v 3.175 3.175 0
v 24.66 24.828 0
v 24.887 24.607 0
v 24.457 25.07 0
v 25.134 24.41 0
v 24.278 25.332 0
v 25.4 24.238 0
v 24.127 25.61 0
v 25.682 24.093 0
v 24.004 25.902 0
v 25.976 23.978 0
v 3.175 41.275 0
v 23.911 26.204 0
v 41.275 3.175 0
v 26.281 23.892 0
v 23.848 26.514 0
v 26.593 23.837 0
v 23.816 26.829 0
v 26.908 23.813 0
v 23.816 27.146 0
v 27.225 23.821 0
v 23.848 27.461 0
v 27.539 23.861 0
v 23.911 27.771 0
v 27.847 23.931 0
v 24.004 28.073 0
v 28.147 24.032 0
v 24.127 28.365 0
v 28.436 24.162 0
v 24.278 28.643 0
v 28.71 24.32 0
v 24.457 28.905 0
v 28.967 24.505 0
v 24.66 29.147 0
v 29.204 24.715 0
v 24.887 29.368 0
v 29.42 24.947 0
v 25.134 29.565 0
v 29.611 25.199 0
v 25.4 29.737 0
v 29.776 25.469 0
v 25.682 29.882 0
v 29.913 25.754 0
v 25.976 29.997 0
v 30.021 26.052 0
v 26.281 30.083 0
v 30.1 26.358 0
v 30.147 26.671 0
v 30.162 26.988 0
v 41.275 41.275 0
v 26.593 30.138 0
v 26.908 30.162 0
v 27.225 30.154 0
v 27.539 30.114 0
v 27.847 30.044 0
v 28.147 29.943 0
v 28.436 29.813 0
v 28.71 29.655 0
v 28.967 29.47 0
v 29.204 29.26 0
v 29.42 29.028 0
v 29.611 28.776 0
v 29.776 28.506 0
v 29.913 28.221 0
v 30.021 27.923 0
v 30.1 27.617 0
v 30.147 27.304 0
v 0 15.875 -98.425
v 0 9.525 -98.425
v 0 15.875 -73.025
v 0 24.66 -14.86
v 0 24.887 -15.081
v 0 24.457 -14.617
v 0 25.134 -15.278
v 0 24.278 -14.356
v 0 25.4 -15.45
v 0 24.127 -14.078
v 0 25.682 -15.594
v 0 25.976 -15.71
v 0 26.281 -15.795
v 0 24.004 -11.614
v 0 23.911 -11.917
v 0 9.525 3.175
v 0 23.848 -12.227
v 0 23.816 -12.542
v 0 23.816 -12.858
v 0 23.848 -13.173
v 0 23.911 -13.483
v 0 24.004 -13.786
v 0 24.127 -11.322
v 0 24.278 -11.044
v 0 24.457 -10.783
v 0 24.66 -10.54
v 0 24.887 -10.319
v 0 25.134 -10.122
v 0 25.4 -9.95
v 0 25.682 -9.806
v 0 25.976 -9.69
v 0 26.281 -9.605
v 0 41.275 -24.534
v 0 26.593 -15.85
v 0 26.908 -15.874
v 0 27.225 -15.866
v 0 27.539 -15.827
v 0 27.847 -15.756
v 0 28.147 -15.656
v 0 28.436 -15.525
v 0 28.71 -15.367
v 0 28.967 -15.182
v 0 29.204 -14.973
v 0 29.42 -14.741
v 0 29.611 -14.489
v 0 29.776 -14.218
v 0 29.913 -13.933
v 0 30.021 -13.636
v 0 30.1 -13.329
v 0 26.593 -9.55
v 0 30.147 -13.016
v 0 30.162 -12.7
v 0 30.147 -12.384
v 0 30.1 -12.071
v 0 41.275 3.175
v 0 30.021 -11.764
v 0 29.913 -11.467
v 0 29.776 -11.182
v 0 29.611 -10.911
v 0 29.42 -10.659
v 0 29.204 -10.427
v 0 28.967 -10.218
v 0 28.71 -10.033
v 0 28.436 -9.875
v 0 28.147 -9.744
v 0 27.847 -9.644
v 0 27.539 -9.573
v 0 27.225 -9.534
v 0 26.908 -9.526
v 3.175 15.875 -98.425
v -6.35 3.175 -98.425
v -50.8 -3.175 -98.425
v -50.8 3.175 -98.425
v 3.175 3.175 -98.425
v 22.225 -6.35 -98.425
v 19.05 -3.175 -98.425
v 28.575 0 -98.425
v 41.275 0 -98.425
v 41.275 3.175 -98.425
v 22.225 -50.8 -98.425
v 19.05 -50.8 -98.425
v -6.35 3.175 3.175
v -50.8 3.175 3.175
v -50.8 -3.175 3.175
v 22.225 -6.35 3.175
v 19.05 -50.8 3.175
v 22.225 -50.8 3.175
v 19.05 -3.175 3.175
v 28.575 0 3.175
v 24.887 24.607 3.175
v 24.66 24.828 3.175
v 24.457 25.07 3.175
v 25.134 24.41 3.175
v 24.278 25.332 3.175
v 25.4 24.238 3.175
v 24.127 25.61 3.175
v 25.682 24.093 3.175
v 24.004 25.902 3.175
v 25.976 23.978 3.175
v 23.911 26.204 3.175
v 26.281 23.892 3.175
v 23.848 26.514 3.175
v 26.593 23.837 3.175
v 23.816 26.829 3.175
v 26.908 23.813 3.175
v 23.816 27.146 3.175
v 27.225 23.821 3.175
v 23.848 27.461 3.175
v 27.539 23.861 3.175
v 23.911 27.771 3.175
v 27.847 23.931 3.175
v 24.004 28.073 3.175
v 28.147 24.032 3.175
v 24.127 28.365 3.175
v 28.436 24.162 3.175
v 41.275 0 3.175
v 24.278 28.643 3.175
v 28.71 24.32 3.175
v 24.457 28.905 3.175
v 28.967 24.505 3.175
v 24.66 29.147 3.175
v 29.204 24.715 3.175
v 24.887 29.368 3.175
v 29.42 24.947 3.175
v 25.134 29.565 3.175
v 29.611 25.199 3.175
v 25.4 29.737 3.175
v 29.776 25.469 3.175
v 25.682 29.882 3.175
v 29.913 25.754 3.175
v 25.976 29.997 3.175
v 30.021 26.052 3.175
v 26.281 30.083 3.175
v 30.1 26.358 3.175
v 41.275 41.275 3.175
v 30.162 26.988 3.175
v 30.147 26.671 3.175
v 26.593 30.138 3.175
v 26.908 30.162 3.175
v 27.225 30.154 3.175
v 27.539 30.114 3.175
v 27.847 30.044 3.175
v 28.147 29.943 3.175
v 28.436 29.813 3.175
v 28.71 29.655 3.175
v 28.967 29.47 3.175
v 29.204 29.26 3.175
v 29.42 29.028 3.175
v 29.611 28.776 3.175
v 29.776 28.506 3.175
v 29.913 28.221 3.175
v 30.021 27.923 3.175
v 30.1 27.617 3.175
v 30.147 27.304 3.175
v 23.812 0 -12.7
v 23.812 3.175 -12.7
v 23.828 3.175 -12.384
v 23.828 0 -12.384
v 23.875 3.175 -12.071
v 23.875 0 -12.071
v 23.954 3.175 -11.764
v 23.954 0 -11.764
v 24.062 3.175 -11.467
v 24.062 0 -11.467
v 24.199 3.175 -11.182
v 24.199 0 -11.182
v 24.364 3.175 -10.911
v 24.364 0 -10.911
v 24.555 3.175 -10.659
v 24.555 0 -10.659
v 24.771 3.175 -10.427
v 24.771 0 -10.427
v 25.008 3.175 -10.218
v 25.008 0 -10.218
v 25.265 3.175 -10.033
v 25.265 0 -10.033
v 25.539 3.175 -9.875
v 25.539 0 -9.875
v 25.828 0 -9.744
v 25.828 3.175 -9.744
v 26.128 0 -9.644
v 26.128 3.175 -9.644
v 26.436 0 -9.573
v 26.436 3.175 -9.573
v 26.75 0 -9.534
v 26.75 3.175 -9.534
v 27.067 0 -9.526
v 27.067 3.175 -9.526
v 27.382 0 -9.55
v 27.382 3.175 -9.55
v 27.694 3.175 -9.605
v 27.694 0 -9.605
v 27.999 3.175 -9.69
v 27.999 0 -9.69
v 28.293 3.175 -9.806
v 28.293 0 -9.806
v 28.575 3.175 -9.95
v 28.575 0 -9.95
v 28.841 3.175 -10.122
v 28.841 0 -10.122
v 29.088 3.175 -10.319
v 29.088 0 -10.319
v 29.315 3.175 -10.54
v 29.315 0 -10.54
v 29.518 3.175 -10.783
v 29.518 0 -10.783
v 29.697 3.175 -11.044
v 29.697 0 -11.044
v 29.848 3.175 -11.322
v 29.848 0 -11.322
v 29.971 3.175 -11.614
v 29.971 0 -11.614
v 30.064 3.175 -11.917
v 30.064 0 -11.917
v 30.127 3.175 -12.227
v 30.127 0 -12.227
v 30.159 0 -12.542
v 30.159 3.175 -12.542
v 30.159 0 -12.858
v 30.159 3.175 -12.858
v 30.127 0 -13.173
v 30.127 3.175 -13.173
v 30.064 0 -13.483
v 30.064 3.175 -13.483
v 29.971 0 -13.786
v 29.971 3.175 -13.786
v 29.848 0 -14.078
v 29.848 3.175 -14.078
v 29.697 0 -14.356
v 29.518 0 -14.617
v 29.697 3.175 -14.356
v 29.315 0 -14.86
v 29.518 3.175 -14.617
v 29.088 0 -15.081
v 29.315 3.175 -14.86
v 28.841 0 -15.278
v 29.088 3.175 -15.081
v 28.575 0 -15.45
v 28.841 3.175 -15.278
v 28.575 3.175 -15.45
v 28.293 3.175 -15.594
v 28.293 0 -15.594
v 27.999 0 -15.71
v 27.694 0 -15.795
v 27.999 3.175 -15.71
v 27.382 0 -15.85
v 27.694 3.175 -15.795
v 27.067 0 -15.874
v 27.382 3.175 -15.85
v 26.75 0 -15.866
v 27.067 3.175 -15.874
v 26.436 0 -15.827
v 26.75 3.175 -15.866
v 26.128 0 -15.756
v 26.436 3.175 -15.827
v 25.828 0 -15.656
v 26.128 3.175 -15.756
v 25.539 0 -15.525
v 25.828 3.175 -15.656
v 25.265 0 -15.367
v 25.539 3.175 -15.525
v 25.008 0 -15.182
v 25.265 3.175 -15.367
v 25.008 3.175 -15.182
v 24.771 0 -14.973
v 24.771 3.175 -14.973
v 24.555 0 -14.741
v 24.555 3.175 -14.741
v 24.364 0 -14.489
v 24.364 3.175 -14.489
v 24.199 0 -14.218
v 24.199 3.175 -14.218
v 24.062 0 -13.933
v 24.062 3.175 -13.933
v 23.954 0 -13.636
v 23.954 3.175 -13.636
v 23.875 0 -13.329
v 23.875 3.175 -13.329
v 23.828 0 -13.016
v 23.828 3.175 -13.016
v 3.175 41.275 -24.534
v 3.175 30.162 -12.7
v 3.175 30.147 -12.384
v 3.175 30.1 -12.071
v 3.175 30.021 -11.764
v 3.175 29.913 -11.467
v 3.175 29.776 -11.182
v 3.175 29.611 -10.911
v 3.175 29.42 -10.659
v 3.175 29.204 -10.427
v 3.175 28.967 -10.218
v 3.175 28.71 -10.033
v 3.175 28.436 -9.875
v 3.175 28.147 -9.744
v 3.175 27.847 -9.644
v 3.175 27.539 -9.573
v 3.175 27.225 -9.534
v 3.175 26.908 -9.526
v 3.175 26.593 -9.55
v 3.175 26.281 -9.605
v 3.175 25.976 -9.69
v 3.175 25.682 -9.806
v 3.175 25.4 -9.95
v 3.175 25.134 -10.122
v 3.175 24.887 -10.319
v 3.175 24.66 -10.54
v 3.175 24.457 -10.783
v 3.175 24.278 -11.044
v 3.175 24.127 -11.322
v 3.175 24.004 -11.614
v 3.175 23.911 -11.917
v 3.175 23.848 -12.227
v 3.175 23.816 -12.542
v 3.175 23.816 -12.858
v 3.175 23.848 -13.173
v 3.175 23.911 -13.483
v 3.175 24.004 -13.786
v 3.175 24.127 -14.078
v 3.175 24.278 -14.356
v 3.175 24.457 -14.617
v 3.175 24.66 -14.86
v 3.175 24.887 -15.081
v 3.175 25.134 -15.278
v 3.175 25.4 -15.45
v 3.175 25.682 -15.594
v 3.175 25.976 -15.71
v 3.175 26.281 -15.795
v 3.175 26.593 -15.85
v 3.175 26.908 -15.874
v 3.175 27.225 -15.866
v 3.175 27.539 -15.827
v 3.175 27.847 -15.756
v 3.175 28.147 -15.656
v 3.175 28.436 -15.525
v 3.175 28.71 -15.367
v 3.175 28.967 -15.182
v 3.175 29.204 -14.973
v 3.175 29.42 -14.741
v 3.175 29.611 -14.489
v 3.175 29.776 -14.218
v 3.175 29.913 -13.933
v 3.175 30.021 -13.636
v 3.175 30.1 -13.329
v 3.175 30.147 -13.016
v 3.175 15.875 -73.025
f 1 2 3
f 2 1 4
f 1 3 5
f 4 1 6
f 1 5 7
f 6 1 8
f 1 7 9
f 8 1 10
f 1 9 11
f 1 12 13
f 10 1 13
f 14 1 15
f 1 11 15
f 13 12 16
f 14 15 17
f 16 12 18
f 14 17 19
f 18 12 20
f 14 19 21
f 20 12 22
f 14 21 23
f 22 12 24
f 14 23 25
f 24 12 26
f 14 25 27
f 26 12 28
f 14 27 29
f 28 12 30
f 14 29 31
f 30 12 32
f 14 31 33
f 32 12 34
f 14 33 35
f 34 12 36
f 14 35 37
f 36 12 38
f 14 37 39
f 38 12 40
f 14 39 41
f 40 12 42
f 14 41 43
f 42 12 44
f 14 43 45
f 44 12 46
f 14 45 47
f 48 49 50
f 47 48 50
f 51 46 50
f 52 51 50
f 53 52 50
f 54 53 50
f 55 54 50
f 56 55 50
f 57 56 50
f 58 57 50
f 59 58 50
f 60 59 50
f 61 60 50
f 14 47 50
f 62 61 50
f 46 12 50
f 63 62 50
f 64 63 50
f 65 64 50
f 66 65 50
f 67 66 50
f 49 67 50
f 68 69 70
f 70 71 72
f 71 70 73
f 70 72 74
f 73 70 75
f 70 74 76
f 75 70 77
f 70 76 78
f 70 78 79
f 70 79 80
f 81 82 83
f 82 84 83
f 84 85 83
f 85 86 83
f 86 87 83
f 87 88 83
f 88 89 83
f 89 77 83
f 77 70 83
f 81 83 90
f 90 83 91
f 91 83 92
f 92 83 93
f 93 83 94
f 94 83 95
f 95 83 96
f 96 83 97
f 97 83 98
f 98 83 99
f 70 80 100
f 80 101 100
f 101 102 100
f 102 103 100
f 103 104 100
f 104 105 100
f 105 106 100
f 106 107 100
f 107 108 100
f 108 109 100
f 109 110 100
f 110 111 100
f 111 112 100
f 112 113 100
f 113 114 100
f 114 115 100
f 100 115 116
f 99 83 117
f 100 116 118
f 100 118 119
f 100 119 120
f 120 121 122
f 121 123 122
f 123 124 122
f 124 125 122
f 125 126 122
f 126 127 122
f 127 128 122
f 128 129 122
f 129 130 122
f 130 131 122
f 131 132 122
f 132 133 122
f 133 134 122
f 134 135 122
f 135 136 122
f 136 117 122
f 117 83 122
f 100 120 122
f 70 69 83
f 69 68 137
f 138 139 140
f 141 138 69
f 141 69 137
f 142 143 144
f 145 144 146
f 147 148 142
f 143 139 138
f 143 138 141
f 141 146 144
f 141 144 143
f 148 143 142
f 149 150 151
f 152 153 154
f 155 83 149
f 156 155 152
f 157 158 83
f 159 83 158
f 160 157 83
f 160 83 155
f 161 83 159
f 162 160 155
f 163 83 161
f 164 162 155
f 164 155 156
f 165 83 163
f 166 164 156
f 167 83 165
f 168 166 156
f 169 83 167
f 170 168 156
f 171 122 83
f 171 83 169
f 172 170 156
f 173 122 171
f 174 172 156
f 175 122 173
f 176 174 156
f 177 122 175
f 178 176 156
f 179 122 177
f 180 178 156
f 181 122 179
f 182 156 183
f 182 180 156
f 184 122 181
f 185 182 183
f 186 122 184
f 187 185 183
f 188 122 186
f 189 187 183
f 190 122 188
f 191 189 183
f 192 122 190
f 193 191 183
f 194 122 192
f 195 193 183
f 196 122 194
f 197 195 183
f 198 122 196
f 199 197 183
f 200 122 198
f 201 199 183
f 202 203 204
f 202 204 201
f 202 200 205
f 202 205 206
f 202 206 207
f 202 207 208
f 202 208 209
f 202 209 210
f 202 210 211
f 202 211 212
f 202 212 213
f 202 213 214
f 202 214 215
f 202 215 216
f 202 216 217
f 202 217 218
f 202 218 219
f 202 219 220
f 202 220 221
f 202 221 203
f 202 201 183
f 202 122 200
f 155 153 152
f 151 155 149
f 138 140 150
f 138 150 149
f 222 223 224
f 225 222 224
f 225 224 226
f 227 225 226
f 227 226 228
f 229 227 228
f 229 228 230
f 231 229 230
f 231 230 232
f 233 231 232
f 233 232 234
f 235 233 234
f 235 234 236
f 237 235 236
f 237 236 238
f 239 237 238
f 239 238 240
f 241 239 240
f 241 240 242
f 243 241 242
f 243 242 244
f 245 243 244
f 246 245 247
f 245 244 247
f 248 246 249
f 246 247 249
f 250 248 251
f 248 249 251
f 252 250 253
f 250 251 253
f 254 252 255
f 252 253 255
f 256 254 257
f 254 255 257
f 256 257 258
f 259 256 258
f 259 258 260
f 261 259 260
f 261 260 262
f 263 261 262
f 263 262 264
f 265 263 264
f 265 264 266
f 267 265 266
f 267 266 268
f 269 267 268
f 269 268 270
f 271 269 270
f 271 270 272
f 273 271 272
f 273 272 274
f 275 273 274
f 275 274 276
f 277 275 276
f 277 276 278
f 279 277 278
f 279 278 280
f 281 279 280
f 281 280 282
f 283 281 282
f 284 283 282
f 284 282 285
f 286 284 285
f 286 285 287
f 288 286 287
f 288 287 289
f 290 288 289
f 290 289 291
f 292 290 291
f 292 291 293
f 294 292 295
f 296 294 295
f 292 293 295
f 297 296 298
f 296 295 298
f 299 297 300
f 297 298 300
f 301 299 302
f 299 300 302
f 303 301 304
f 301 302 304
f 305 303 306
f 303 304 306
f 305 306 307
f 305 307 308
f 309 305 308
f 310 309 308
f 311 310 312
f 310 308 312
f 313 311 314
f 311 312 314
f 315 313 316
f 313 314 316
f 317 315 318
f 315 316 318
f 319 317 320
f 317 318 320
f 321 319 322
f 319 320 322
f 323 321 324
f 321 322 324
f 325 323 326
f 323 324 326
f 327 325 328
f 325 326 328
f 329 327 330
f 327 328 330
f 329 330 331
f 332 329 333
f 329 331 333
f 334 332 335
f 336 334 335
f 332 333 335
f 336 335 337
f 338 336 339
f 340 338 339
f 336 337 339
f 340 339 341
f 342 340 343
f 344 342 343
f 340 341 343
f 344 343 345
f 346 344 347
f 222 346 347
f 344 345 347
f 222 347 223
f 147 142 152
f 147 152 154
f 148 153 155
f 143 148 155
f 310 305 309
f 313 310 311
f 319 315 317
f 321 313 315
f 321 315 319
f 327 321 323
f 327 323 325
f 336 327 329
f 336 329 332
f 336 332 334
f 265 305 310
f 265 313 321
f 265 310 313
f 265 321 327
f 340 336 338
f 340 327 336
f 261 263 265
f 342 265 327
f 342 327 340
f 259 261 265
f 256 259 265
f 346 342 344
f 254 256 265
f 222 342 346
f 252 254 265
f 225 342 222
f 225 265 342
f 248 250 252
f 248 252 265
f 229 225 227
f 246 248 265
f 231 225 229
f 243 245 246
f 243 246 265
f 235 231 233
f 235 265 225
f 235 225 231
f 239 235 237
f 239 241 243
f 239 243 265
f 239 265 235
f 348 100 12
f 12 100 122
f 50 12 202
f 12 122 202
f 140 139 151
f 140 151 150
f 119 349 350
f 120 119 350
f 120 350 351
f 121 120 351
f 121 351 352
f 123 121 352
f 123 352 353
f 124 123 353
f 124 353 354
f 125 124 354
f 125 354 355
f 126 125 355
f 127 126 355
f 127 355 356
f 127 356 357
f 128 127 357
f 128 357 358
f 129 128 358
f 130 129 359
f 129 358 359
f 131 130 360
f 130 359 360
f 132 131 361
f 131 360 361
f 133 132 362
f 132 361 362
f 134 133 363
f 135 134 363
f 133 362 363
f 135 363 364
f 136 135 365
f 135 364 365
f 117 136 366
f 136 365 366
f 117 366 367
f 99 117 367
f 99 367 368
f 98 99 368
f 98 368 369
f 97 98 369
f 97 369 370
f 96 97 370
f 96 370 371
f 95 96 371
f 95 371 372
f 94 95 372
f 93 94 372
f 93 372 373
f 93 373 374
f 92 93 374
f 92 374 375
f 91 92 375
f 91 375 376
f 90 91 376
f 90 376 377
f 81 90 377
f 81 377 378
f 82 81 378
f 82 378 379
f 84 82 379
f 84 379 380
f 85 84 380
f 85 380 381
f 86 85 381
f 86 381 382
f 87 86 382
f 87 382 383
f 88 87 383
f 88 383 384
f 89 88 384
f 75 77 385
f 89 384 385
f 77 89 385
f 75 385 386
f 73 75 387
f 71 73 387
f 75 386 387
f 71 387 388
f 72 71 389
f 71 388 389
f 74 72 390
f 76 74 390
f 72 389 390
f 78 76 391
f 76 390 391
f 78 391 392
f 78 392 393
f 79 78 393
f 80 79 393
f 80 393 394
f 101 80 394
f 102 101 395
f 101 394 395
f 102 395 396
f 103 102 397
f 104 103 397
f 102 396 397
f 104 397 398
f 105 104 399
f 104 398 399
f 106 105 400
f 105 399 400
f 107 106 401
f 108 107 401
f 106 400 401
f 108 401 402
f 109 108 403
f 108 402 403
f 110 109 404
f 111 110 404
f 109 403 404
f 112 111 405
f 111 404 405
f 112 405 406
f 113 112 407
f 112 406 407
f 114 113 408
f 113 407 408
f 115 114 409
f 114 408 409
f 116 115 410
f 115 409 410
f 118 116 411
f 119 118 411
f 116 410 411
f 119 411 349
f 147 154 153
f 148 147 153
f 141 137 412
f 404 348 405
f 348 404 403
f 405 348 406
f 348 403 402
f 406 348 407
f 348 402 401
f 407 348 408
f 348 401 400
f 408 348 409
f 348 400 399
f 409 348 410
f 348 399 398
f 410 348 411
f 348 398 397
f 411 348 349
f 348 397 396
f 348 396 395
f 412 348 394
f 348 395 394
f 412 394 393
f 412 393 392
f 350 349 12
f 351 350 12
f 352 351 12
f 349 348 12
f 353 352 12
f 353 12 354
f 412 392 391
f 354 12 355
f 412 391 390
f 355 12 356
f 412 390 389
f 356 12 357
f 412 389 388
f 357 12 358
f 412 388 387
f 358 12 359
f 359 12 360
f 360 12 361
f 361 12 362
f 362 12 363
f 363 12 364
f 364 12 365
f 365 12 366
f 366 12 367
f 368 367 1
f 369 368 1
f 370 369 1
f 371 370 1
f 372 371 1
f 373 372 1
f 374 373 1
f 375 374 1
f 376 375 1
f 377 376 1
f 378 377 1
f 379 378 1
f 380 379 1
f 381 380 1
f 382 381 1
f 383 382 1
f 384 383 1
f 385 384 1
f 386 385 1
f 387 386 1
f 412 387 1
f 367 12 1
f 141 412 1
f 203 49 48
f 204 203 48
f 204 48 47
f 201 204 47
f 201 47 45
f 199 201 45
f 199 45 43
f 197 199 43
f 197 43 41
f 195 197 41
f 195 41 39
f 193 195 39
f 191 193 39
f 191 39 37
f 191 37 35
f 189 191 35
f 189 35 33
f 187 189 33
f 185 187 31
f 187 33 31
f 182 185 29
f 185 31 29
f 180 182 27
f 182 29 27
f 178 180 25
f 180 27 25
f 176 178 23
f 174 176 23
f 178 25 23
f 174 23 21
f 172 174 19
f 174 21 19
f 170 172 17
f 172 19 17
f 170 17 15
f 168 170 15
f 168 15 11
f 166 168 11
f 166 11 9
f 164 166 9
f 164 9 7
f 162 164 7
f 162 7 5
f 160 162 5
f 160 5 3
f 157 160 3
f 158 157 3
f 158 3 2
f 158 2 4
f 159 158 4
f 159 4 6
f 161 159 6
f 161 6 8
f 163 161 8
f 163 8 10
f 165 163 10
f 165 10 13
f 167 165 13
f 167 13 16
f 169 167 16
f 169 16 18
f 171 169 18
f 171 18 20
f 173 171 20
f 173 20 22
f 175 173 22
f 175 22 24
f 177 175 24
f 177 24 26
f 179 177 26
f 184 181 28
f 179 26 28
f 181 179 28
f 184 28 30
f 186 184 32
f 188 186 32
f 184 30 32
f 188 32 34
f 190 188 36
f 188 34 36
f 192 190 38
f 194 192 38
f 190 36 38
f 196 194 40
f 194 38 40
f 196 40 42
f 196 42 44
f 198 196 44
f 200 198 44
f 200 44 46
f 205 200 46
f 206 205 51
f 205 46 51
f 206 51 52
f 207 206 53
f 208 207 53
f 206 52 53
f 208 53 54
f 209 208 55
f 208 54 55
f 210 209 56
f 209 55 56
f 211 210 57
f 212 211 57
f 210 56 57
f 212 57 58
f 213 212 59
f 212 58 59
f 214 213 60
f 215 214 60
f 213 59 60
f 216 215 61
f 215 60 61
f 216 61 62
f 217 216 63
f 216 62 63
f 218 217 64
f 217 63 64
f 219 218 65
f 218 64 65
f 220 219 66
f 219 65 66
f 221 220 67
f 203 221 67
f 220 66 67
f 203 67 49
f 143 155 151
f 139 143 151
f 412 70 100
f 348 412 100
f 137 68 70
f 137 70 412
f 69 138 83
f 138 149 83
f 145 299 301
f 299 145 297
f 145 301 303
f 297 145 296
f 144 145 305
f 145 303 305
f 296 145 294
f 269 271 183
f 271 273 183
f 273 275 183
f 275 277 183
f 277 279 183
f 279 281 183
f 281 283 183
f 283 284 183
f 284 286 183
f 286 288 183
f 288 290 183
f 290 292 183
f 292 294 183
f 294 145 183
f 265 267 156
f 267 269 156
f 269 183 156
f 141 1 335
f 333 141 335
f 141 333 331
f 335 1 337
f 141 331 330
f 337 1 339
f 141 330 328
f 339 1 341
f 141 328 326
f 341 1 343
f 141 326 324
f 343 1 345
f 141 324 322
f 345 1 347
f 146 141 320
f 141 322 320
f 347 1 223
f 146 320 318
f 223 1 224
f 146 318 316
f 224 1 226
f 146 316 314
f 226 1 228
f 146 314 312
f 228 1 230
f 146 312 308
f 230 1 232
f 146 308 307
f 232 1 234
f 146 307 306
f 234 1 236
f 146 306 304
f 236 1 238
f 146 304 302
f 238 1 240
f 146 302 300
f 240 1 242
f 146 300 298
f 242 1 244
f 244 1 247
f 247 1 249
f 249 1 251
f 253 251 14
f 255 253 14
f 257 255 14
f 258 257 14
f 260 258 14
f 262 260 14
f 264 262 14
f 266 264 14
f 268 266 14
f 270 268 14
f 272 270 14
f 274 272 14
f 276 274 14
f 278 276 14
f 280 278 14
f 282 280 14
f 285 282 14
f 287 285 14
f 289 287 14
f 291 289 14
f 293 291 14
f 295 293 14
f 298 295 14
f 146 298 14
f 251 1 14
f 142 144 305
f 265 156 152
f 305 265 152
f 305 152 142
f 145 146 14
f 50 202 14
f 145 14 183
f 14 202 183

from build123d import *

# Parameters (mm, degrees)
F0_W          = 50.8
F0_H          = 50.8
F1_DEPTH      = 3.175
F2_W          = 50.8
F2_H          = 3.175
F3_DEPTH      = 12.7
F3_DEPTH_BACK = 76.2
F4_W          = 3.175
F4_H          = 101.6
F5_DEPTH      = 12.7
F5_DEPTH_BACK = 76.2
F7_W          = 47.625
F7_H          = 12.7
F8_DEPTH      = 25.4
F9_W          = 47.625
F9_H          = 12.7
F10_DEPTH     = 25.4
F12_DEPTH     = 25.4
F14_DEPTH     = 25.4
F16_DEPTH     = 53.976
F18_DEPTH     = 76.2
F19_R         = 3.175
F20_DEPTH     = 25.4
F21_R         = 3.175
F22_DEPTH     = 25.4
F23_R         = 3.175
F24_DEPTH     = 25.4
F26_DEPTH     = 76.201
F27_DEPTH     = 3.175
F29_DEPTH     = 76.2
F31_DEPTH     = 76.201
F32_W         = 3.175
F32_H         = 76.2
F33_DEPTH     = 12.7
F35_DEPTH     = 25.4


with BuildPart() as f1:
    # F0 (on Top) → F1 (new body)
    with BuildSketch(Plane.XY):
        with Locations((25.4, 25.4)):
            Rectangle(F0_W, F0_H)
    extrude(amount=F1_DEPTH)

    # F2 (on face) → F3 (join, two sides)
    with BuildSketch(Plane.XY.offset(3.175)) as f3_sk:
        with Locations((-25.4, 1.5875)):
            Rectangle(F2_W, F2_H)
        with Locations((25.4, 1.5875)):
            Rectangle(F2_W, F2_H)
    extrude(amount=F3_DEPTH)
    extrude(f3_sk.sketch, amount=-F3_DEPTH_BACK)

    # F4 (on face) → F5 (join, two sides)
    with BuildSketch(Plane.XY.offset(3.175)) as f5_sk:
        with Locations((1.5875, 0)):
            Rectangle(F4_W, F4_H)
    extrude(amount=F5_DEPTH)
    extrude(f5_sk.sketch, amount=-F5_DEPTH_BACK)

    # F7 (on face) → F8 (cut)
    with BuildSketch(Plane.YZ.offset(3.175)):
        with Locations((26.9875, 9.525)):
            Rectangle(F7_W, F7_H)
    extrude(amount=-F8_DEPTH, mode=Mode.SUBTRACT)

    # F9 (on face) → F10 (cut)
    with BuildSketch(Plane(origin=(0, 3.175, 0), x_dir=(-1, 0, 0), z_dir=(0, 1, 0))):
        with Locations((-26.9875, 9.525)):
            Rectangle(F9_W, F9_H)
    extrude(amount=-F10_DEPTH, mode=Mode.SUBTRACT)

    # F11 (on face) → F12 (cut)
    with BuildSketch(Plane.XZ):
        Polygon((50.8, -6.35), (41.275, -73.025), (50.8, -73.025), align=None)
    extrude(amount=-F12_DEPTH, mode=Mode.SUBTRACT)

    # F13 (on face) → F14 (cut)
    with BuildSketch(Plane(origin=(0, 0, 0), x_dir=(0, -1, 0), z_dir=(-1, 0, 0))):
        Polygon((-15.875, -73.025), (-50.8, -6.35), (-50.8, -73.025), align=None)
    extrude(amount=-F14_DEPTH, mode=Mode.SUBTRACT)

    # F15 (on face) → F16 (cut, through all)
    with BuildSketch(Plane(origin=(0, 3.175, 0), x_dir=(-1, 0, 0), z_dir=(0, 1, 0))):
        Polygon((50.8, 15.875), (-3.175, 15.875), (-3.175, 3.175), (0, 3.175), (50.8, 3.175), align=None)
    extrude(amount=-F16_DEPTH, mode=Mode.SUBTRACT)

    # F17 (on face) → F18 (join, through all)
    with BuildSketch(Plane.XY.offset(3.175)):
        Polygon((9.525, 0), (3.175, 0), (3.175, -6.35), align=None)
        Polygon((-6.35, 3.175), (0, 3.175), (0, 9.525), align=None)
    extrude(amount=-F18_DEPTH)

    # F19 (on face) → F20 (cut)
    with BuildSketch(Plane(origin=(0, 3.175, 0), x_dir=(-1, 0, 0), z_dir=(0, 1, 0))):
        with Locations((-26.9875, -12.7)):
            Circle(F19_R)
    extrude(amount=-F20_DEPTH, mode=Mode.SUBTRACT)

    # F21 (on face) → F22 (cut)
    with BuildSketch(Plane.YZ.offset(3.175)):
        with Locations((26.9875, -12.7)):
            Circle(F21_R)
    extrude(amount=-F22_DEPTH, mode=Mode.SUBTRACT)

    # F23 (on face) → F24 (cut)
    with BuildSketch(Plane(origin=(0, 0, 0), x_dir=(1, 0, 0), z_dir=(0, 0, -1))):
        with Locations((26.9875, -26.9875)):
            Circle(F23_R)
    extrude(amount=-F24_DEPTH, mode=Mode.SUBTRACT)

    # F25 (on face) → F26 (cut, through all)
    with BuildSketch(Plane.XY.offset(3.175)):
        Polygon((41.275, 0), (50.8, 0), (50.8, 50.8), (41.275, 50.8), (0, 50.8), (0, 41.275), (41.275, 41.275), align=None)
    extrude(amount=-F26_DEPTH, mode=Mode.SUBTRACT)

    # F27 (add): a face of the model
    f27_faces = [f1.faces().sort_by_distance(p)[0] for p in [
        (-25.4, 0, -34.925),
    ]]
    extrude(f27_faces, amount=F27_DEPTH)

    # F28 (on face) → F29 (join, through all)
    with BuildSketch(Plane.XY.offset(3.175)):
        Polygon((28.575, 0), (22.225, 0), (19.05, 0), (19.05, -50.8), (22.225, -50.8), (22.225, -6.35), align=None)
    extrude(amount=-F29_DEPTH)

    # F30 (on face) → F31 (cut, through all)
    with BuildSketch(Plane.XY.offset(3.175)):
        Polygon((0, -50.8), (3.175, -50.8), (3.175, -6.35), (6.35, -3.175), (0, -3.175), align=None)
    extrude(amount=-F31_DEPTH, mode=Mode.SUBTRACT)

    # F32 (on face) → F33 (join, through all)
    with BuildSketch(Plane(origin=(19.05, 0, 0), x_dir=(0, -1, 0), z_dir=(-1, 0, 0))):
        with Locations((1.5875, -34.925)):
            Rectangle(F32_W, F32_H)
    extrude(amount=F33_DEPTH)

    # F34 (on face) → F35 (join)
    with BuildSketch(Plane(origin=(0, 0, -73.025), x_dir=(1, 0, 0), z_dir=(0, 0, -1))):
        Polygon((19.05, 3.175), (6.35, 3.175), (-50.8, 3.175), (-50.8, -3.175), (-6.35, -3.175), (0, -9.525), (0, -15.875), (3.175, -15.875), (3.175, -3.175), (41.275, -3.175), (41.275, 0), (28.575, 0), (22.225, 6.35), (22.225, 50.8), (19.05, 50.8), align=None)
    extrude(amount=F35_DEPTH)


solid = f1.part
